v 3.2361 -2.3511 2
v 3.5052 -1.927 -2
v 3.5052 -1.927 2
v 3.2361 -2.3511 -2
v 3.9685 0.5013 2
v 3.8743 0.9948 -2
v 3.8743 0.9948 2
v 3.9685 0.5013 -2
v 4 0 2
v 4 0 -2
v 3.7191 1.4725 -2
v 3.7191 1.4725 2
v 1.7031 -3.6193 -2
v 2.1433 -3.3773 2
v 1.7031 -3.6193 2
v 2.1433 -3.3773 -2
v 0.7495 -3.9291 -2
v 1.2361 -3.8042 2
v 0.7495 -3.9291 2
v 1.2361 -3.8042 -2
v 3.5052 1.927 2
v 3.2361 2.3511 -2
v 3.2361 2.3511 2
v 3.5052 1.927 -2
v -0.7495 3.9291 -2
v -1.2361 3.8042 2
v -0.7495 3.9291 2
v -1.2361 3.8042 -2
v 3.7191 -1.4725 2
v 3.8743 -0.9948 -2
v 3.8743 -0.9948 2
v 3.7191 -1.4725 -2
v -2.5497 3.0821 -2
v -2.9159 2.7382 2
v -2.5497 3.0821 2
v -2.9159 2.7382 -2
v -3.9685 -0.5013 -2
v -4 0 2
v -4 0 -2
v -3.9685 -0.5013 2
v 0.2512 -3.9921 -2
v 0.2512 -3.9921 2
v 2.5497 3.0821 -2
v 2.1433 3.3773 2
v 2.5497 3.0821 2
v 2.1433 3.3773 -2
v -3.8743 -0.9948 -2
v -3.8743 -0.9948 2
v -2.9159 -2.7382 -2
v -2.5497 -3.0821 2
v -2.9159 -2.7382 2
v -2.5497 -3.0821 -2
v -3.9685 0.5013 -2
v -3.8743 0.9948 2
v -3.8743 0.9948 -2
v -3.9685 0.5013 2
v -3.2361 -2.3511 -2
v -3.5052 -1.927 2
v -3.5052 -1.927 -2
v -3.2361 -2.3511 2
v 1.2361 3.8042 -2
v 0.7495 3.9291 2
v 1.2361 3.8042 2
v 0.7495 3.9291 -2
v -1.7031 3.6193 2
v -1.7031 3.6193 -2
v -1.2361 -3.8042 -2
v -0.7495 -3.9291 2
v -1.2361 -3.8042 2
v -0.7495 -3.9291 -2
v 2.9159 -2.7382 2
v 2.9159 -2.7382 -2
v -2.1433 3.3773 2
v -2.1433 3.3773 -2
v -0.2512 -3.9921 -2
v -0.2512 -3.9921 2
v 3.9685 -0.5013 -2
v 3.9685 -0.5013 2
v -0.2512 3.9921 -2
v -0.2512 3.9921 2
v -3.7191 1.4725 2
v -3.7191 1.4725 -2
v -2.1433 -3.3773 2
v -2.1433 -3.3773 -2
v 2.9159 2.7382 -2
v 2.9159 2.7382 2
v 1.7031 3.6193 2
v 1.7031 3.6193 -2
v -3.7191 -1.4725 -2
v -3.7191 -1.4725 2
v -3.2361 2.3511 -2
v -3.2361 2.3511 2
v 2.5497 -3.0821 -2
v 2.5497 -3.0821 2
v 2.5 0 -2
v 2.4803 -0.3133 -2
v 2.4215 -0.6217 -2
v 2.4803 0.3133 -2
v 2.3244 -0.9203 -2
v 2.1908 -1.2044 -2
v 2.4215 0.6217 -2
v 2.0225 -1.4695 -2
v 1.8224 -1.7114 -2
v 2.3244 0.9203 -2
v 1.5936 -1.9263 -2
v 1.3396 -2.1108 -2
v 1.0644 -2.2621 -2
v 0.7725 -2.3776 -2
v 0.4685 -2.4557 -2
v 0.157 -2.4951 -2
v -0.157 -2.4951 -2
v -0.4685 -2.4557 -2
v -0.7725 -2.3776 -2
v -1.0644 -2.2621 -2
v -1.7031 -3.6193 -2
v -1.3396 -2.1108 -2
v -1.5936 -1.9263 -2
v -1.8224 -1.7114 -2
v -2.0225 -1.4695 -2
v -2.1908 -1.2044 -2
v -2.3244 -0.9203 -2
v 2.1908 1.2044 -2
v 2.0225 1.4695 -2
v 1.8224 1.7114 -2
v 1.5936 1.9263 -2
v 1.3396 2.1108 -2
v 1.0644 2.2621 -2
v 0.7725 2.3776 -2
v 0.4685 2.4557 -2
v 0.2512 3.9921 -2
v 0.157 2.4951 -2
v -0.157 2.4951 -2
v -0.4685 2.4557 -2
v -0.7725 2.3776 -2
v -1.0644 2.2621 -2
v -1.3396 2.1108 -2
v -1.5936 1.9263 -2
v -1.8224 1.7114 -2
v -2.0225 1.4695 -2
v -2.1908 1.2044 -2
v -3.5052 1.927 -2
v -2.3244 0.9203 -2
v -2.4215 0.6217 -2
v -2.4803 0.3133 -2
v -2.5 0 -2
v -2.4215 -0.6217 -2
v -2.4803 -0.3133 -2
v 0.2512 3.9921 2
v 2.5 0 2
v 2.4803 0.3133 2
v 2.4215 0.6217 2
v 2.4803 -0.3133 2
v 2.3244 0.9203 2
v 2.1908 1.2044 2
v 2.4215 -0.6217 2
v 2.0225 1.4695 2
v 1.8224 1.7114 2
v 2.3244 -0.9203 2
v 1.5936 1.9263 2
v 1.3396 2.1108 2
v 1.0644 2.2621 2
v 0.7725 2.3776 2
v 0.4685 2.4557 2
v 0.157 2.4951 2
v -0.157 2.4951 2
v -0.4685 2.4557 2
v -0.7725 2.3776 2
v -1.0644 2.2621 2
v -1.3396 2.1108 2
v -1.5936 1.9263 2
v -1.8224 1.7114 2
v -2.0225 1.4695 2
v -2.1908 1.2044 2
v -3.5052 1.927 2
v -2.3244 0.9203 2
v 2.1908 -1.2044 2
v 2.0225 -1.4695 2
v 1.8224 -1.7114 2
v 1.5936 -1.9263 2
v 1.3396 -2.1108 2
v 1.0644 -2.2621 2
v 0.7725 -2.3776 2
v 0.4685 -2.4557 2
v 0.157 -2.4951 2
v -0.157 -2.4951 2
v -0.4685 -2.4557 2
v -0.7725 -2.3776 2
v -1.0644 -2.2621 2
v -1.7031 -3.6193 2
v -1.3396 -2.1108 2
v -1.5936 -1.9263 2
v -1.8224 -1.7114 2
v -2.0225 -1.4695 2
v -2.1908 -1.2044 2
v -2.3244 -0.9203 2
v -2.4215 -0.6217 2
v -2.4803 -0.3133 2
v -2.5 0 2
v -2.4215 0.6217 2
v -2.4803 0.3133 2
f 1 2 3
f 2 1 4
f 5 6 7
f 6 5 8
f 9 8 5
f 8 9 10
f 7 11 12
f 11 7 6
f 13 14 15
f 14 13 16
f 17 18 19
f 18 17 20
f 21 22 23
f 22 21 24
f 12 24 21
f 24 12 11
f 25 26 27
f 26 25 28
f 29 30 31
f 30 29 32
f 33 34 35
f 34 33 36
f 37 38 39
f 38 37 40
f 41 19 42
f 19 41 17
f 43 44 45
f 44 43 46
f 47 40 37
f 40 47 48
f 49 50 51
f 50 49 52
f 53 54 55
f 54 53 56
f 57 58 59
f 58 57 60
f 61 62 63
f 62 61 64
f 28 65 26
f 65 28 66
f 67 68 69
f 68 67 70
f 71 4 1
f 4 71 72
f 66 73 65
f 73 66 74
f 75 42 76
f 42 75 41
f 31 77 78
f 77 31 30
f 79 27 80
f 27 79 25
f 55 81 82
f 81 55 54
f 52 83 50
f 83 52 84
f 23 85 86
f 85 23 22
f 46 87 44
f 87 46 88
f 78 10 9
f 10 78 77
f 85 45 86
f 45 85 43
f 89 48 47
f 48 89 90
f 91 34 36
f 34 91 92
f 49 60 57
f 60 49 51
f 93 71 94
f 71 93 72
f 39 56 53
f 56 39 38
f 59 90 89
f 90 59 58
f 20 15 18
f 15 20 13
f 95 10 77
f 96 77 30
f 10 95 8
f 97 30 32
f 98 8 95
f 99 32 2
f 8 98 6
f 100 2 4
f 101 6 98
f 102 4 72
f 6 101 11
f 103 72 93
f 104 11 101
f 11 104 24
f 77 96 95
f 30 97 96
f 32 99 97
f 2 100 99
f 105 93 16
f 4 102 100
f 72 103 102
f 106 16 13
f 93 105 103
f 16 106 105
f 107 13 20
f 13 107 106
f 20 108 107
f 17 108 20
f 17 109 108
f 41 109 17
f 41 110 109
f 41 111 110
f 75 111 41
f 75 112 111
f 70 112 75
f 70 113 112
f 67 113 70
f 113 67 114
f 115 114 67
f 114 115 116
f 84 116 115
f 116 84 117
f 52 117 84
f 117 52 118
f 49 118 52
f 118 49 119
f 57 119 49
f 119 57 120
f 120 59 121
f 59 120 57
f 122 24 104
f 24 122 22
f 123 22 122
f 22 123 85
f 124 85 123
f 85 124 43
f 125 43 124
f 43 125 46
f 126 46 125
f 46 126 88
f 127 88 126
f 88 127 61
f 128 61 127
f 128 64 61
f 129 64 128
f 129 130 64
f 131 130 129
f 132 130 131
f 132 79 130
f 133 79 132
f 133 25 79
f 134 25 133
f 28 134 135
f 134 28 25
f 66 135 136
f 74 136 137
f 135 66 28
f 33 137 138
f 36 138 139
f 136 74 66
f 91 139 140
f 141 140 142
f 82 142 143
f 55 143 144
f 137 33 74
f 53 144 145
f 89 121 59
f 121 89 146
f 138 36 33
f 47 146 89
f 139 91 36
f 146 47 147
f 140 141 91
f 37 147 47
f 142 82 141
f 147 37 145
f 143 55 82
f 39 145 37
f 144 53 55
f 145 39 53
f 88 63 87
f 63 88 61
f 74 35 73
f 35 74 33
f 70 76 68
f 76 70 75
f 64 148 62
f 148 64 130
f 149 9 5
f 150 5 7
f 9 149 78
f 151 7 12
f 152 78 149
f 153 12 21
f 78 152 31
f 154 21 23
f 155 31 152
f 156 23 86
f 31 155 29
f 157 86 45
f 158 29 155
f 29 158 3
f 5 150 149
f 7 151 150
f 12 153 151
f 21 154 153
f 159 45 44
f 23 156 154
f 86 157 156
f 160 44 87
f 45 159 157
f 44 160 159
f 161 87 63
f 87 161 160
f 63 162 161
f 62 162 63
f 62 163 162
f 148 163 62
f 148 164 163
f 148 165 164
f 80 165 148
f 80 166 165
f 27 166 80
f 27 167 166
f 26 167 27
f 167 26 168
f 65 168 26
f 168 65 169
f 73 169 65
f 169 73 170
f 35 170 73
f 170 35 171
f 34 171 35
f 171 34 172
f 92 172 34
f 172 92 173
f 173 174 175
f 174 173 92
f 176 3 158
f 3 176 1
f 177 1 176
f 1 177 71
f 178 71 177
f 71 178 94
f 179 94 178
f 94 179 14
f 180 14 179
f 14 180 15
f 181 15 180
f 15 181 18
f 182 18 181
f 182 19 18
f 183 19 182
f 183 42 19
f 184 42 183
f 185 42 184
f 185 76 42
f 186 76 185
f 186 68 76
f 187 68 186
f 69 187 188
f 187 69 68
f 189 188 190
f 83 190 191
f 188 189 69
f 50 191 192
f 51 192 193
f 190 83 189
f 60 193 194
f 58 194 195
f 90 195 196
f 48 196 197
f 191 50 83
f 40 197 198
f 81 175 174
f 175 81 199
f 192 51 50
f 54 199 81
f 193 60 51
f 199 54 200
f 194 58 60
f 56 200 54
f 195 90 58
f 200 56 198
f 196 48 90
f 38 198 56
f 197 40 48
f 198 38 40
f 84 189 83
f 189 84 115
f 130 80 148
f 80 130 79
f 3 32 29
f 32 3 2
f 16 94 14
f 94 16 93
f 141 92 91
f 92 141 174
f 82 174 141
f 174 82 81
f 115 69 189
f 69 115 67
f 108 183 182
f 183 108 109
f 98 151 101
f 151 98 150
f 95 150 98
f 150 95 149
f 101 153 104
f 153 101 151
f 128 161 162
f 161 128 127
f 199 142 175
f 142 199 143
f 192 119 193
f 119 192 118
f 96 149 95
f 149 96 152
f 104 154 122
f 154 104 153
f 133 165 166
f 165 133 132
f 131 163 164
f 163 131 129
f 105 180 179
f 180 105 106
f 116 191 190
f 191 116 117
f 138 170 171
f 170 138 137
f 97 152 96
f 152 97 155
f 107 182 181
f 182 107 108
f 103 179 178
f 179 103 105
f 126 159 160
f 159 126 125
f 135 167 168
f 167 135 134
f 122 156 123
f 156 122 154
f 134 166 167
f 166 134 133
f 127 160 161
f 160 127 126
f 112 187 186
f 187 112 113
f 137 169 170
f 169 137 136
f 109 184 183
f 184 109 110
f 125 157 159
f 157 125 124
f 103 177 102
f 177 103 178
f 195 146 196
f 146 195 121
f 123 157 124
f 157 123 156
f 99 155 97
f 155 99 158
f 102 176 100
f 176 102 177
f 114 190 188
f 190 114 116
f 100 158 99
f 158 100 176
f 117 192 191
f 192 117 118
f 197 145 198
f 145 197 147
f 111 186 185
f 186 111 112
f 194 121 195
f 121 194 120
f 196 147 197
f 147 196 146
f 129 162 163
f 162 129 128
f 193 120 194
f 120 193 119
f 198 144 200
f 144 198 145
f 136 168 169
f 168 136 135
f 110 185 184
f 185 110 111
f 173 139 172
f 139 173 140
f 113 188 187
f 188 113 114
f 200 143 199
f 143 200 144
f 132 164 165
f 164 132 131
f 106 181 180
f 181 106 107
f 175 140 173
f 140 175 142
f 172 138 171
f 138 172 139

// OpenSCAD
$fn = 50;


difference() {
	union() {
		translate(v = [0, 0, -2.0000000000]) {
			cylinder(h = 4, r = 4.0000000000);
		}
	}
	union() {
		translate(v = [0, 0, -100.0000000000]) {
			cylinder(h = 200, r = 2.5000000000);
		}
	}
}
